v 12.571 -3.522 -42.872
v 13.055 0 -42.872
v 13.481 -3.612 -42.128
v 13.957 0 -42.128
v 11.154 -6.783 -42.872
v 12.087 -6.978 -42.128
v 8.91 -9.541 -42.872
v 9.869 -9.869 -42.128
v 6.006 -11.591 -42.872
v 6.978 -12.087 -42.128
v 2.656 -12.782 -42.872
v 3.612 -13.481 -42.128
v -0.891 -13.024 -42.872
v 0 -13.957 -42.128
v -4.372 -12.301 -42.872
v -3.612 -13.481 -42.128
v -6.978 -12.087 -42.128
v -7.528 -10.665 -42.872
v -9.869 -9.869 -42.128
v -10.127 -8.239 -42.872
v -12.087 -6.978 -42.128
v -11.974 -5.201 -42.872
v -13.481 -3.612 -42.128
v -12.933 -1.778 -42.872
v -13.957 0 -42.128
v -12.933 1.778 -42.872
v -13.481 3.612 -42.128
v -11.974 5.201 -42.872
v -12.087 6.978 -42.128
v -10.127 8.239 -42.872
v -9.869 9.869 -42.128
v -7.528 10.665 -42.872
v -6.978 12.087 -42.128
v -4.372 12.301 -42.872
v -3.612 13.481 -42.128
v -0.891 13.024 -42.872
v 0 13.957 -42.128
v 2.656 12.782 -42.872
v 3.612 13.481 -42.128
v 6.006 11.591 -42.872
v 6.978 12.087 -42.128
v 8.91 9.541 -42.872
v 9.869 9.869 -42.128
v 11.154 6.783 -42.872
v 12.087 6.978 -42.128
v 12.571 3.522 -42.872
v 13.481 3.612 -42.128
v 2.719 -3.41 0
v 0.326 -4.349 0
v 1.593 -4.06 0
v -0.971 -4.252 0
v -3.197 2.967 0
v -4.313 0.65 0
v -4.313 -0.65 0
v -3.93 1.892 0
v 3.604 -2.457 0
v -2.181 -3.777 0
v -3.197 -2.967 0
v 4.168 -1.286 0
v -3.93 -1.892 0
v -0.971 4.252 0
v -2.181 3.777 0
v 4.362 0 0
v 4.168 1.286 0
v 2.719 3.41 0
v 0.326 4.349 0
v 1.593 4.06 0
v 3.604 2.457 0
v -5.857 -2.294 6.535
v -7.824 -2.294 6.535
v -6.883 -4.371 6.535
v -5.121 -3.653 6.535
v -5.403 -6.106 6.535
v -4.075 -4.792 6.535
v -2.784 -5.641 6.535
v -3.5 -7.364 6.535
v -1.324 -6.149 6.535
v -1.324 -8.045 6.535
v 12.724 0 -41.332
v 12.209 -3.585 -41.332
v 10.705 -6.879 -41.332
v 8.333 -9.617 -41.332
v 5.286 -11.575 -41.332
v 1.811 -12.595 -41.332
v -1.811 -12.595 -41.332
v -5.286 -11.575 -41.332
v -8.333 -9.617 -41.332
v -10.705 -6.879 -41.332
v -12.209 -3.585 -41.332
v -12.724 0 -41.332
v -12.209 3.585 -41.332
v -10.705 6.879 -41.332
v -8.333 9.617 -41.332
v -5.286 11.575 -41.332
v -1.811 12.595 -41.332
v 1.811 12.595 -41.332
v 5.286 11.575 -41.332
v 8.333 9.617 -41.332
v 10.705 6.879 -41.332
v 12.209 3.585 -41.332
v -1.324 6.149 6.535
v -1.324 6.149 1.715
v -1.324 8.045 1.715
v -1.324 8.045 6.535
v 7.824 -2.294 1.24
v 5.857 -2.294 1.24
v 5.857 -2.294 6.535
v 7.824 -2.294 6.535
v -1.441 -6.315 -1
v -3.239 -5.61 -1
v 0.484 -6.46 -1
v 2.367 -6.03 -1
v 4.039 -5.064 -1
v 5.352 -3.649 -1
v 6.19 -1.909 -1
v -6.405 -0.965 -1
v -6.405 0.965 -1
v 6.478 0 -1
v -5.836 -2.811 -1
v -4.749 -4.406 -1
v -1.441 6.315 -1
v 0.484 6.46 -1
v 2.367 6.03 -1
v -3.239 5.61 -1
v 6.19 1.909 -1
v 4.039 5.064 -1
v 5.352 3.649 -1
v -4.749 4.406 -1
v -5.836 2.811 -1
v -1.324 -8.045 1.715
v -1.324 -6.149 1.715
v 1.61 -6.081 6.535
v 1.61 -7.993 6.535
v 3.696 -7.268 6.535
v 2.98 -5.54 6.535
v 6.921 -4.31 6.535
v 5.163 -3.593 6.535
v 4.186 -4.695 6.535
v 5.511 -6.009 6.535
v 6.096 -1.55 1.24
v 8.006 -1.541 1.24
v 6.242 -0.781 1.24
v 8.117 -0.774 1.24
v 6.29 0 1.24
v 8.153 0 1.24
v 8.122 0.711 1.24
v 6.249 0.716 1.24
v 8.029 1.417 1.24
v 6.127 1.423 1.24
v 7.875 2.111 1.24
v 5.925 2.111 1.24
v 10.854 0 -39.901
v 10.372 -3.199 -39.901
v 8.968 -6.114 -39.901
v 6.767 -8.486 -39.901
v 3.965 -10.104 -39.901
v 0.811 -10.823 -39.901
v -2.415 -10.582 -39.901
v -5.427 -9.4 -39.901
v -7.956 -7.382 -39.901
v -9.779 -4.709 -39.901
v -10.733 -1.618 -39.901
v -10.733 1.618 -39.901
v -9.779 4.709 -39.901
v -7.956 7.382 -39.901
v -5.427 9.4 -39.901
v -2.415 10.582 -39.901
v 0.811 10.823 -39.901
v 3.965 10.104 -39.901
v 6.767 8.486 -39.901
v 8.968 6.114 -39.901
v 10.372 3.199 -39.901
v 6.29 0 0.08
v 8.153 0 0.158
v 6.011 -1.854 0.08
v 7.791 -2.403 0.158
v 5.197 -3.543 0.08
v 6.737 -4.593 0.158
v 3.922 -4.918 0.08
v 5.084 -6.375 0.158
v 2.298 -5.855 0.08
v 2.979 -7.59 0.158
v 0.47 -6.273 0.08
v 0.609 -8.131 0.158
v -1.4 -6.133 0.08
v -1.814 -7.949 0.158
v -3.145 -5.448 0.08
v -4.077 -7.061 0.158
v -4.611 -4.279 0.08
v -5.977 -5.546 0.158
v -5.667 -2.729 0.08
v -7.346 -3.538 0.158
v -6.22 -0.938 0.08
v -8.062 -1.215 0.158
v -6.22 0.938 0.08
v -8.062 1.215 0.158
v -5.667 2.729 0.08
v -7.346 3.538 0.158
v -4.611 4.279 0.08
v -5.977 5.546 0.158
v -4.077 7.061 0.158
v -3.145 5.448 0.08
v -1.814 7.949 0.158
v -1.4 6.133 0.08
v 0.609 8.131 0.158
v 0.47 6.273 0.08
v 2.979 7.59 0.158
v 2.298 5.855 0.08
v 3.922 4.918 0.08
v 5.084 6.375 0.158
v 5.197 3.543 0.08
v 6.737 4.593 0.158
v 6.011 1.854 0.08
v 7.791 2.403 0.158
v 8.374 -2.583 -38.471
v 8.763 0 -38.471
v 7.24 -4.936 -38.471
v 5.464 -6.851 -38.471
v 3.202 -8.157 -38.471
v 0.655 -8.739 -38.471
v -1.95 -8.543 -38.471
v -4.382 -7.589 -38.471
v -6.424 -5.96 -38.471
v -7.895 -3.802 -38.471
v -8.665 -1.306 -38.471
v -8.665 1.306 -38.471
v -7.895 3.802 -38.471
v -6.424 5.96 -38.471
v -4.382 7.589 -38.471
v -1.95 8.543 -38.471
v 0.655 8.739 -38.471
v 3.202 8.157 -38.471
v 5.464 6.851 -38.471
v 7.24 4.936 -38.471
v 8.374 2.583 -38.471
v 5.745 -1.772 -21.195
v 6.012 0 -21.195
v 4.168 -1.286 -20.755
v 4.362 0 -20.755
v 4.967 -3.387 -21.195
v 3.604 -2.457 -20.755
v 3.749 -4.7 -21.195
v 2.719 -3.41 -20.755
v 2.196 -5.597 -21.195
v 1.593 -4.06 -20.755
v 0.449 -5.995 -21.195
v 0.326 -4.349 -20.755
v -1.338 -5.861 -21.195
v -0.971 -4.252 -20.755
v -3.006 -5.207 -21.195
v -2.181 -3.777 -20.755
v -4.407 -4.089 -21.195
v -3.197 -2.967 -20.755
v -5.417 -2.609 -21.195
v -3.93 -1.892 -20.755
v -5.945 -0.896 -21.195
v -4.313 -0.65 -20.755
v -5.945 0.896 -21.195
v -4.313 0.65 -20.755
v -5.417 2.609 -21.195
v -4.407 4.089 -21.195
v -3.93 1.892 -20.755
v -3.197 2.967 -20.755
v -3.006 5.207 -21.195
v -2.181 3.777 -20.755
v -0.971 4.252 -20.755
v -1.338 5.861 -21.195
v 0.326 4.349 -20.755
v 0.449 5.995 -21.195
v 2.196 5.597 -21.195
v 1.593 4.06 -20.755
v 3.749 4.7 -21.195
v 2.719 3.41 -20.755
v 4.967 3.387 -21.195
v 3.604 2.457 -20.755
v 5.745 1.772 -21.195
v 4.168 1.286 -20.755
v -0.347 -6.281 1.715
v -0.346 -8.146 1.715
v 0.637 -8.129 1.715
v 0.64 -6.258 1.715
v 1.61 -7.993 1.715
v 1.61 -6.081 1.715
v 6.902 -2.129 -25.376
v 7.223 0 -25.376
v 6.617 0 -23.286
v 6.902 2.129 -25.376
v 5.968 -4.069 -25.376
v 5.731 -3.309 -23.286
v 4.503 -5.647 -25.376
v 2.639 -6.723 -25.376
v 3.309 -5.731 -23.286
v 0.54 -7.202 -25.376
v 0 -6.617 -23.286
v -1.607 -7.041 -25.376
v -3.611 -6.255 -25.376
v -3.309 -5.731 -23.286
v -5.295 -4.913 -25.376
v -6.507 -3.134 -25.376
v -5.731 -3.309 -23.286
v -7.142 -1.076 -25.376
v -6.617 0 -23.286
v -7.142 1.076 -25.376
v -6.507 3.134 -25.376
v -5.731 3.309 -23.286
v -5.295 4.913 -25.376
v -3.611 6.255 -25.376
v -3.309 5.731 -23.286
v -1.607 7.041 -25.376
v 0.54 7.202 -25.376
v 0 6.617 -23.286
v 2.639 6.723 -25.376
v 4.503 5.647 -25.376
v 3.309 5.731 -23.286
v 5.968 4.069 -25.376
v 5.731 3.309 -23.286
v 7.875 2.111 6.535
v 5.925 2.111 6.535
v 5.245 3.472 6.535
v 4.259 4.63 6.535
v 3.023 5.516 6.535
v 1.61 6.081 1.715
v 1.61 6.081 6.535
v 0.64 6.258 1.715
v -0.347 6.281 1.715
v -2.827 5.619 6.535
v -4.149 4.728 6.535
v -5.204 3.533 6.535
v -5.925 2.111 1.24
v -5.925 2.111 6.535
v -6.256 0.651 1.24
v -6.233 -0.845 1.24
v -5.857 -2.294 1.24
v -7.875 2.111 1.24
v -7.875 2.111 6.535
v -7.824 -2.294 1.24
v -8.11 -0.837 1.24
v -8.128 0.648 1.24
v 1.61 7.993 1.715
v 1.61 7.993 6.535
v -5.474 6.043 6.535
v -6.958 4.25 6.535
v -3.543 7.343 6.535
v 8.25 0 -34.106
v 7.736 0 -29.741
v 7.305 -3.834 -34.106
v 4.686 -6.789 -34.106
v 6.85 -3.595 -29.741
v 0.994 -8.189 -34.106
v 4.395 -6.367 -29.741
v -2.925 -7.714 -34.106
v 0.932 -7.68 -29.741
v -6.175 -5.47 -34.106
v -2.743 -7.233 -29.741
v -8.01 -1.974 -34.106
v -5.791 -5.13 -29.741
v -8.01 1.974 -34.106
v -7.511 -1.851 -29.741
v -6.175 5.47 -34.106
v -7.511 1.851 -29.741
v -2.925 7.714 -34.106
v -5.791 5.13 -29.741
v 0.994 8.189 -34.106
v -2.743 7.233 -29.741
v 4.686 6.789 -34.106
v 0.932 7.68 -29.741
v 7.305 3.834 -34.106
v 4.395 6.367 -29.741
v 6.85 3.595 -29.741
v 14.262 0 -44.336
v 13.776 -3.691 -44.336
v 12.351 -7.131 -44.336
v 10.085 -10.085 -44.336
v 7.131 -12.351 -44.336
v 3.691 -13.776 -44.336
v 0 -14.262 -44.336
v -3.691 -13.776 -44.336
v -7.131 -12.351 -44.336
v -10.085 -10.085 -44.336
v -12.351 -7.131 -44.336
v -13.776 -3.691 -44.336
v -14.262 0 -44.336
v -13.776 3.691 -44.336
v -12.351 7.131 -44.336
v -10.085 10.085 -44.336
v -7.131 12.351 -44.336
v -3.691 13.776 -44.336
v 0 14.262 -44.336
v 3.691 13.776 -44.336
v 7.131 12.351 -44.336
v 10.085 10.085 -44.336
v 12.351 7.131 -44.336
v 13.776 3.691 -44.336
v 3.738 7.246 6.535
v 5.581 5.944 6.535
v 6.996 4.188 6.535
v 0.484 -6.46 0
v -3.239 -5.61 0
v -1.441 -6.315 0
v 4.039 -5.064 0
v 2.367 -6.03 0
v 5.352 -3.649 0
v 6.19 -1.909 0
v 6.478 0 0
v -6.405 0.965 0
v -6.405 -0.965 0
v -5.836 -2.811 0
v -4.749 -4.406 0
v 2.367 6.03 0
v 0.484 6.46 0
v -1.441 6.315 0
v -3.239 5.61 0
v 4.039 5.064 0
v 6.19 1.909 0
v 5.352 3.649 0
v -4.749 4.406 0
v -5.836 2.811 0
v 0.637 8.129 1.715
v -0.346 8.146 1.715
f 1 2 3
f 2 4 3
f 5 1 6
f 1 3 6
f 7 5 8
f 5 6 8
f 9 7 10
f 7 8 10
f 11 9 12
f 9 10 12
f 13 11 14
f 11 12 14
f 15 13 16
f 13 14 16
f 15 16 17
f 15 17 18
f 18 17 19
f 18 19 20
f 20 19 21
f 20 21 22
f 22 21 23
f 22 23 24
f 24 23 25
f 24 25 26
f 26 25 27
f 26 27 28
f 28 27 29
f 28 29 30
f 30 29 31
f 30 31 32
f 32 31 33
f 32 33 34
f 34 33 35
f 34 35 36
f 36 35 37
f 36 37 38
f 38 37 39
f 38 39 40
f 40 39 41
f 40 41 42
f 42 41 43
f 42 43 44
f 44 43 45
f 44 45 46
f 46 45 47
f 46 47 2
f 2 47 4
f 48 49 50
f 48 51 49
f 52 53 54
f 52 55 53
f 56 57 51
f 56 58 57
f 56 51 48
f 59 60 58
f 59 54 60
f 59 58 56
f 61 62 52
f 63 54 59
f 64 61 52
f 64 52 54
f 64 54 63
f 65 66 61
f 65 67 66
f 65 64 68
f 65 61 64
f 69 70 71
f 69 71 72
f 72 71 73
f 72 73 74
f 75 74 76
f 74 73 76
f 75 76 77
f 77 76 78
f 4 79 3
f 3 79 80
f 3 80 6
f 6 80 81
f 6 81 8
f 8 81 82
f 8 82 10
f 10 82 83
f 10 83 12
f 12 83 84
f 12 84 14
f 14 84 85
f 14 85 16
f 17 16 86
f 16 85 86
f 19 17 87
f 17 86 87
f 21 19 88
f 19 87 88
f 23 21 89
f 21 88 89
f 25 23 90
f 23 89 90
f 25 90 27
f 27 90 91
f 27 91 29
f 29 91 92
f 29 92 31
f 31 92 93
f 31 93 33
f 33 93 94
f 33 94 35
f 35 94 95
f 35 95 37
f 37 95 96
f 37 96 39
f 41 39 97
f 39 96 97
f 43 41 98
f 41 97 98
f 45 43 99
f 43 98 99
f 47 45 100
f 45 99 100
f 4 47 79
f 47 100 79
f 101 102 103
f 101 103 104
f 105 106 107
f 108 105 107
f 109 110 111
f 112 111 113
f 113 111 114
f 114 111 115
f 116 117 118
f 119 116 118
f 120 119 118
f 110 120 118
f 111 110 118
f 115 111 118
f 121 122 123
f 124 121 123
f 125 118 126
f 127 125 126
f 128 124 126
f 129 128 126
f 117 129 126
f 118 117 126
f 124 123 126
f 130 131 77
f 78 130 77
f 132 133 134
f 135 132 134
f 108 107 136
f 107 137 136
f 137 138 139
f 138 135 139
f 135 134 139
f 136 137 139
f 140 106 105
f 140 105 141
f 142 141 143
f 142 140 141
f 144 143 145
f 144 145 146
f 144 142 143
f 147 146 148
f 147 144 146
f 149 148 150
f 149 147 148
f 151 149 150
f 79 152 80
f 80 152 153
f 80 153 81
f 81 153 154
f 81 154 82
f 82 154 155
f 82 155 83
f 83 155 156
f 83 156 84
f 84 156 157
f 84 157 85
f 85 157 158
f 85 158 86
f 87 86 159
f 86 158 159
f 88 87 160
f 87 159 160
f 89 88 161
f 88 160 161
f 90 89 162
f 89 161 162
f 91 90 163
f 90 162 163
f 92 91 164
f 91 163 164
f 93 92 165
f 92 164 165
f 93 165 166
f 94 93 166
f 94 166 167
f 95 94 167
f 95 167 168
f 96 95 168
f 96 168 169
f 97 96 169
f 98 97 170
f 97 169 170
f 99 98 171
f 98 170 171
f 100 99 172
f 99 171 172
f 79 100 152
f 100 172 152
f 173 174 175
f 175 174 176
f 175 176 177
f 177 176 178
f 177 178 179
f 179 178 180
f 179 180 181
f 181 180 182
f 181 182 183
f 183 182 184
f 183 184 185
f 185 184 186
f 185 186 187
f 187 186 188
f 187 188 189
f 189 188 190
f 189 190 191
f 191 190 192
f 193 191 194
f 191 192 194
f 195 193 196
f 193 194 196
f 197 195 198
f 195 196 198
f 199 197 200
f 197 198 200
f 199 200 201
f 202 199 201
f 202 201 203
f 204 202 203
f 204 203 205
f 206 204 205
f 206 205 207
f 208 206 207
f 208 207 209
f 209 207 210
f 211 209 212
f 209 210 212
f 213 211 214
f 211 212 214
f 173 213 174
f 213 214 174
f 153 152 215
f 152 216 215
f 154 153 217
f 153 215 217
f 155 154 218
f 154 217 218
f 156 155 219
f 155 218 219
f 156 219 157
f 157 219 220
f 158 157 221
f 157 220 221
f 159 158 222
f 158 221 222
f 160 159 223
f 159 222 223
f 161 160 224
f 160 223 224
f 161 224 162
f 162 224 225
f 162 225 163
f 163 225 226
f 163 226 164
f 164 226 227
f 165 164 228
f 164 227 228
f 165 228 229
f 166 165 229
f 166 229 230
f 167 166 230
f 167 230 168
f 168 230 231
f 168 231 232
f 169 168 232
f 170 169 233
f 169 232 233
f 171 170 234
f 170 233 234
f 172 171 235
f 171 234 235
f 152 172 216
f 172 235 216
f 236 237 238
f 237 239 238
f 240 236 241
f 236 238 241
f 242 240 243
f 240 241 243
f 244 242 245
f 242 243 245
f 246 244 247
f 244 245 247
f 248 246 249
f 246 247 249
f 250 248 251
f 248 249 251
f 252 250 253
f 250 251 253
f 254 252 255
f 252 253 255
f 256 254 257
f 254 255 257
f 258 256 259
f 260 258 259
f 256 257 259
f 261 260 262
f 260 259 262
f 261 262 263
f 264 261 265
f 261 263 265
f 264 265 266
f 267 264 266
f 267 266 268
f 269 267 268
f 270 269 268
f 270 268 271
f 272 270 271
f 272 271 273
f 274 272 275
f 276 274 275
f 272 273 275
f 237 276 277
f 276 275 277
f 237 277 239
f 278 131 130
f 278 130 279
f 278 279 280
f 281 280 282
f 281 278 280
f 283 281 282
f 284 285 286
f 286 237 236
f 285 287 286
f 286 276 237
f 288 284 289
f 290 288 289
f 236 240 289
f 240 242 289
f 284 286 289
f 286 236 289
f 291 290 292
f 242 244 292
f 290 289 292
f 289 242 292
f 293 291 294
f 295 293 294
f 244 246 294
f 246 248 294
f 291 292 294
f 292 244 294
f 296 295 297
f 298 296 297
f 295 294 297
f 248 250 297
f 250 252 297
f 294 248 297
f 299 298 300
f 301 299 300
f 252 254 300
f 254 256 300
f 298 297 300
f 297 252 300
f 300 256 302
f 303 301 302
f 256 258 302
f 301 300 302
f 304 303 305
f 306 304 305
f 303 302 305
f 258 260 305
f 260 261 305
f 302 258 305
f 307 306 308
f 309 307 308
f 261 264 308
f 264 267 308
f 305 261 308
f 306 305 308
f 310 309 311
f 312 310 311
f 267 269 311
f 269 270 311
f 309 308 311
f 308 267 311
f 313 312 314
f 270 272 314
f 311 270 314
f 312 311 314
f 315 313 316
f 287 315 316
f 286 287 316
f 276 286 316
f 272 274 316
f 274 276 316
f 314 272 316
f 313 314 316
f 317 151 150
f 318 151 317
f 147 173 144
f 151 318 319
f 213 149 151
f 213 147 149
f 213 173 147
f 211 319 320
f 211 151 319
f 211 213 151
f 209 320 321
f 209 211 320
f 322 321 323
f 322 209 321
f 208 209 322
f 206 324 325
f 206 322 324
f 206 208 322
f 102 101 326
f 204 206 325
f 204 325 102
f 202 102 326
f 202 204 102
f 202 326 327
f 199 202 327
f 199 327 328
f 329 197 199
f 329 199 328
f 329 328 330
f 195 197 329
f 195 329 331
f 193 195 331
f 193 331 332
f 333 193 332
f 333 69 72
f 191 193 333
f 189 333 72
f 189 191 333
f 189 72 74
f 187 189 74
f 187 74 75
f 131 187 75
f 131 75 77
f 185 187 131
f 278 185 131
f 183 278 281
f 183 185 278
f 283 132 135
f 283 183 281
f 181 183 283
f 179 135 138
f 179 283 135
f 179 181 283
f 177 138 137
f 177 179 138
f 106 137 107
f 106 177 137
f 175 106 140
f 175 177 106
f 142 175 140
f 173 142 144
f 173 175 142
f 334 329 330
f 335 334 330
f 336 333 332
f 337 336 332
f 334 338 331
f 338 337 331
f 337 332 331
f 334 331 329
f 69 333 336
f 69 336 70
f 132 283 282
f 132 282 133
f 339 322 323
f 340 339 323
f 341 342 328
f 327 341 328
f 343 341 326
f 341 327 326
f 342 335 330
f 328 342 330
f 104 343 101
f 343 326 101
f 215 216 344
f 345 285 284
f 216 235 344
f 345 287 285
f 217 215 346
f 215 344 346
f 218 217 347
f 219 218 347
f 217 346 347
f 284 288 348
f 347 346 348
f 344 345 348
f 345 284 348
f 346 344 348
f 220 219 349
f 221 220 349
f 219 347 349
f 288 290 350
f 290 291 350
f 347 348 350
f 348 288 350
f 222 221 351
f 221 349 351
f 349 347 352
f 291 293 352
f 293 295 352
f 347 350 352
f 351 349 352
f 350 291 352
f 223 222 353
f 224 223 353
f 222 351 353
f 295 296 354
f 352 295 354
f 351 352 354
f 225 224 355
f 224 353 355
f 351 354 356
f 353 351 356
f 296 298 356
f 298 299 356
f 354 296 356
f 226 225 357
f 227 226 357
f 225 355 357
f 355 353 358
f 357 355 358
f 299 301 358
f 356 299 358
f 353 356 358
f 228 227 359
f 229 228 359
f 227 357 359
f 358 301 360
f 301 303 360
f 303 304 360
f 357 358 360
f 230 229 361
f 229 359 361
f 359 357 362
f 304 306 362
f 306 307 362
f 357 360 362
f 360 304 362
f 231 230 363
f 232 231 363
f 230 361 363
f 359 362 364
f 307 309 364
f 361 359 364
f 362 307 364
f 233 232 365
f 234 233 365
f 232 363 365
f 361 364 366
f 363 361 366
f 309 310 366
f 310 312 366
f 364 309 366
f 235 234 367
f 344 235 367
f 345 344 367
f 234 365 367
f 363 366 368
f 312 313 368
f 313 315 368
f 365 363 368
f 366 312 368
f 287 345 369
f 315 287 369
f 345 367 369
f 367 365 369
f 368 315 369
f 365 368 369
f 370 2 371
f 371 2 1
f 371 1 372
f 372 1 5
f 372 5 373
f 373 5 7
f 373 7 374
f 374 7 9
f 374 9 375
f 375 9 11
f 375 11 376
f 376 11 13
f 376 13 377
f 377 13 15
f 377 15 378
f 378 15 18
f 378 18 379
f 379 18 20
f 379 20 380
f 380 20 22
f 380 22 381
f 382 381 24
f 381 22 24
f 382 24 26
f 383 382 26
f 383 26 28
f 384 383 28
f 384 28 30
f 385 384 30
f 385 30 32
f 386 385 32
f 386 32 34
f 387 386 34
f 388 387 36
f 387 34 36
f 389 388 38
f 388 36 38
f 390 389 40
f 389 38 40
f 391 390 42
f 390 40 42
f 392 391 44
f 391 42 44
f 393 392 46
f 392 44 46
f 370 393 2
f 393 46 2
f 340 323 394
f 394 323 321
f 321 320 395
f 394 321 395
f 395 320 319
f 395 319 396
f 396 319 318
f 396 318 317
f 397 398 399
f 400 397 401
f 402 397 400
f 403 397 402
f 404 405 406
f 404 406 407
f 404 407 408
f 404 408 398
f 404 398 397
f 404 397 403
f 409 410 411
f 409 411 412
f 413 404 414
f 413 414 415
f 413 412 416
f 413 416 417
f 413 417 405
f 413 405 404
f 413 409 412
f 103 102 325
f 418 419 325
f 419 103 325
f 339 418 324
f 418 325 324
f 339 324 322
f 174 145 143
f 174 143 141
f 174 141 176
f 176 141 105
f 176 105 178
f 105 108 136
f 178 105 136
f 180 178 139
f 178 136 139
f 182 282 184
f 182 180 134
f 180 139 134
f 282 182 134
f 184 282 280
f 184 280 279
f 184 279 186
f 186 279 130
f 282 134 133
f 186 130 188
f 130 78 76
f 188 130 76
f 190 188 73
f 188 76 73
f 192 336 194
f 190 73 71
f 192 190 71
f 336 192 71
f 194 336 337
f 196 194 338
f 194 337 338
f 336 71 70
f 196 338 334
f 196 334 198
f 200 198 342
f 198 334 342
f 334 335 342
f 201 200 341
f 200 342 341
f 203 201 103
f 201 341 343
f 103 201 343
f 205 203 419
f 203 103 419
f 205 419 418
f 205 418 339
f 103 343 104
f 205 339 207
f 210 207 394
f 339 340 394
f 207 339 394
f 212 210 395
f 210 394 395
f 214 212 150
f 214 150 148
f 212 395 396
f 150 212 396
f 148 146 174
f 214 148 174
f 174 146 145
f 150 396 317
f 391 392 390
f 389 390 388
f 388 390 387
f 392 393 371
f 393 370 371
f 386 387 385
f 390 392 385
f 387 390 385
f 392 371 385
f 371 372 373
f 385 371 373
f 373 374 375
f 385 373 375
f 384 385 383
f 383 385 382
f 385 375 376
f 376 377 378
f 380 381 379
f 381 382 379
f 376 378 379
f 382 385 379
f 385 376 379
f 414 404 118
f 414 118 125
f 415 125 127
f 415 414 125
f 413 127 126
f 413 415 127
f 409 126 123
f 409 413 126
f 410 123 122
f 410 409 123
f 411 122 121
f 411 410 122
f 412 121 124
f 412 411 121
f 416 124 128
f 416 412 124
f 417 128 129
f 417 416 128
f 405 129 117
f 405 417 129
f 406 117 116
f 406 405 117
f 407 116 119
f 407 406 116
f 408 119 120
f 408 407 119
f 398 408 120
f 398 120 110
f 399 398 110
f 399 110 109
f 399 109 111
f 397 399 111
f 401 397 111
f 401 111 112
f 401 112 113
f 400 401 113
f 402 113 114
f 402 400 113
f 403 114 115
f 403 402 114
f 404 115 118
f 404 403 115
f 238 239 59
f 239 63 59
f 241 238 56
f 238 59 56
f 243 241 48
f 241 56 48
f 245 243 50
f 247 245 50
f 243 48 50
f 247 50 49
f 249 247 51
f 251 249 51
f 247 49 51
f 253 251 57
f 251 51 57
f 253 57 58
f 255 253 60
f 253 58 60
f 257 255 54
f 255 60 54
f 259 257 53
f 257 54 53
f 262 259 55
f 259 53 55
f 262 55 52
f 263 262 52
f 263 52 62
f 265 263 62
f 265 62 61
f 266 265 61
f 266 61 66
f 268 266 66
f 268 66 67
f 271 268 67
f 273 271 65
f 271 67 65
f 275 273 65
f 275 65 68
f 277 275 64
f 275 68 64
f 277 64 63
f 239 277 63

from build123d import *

# Parameters (mm, degrees)
F2_R          = 6.2903170644
F3_DEPTH      = 25
F4_W          = 2.9345224611
F4_H          = 4.864071263
F5_DEPTH      = 25
F5_DEPTH_BACK = 25
F6_W          = 4.4057860505
F6_H          = 5.4571669316
F7_DEPTH      = 25
F7_DEPTH_BACK = 25
F8_R          = 6.4777323638
F9_DEPTH      = 1


with BuildPart() as f1:
    # F0 (on Front) → F1 (revolve)
    with BuildSketch(Plane.XZ):
        Polygon((0, 6.5942350894), (0, -44.3356335163), (14.261810109, -44.3356335163), (13.05461023, -42.8724400699), (13.9565062012, -42.1283356524), (12.7244954929, -41.331898421), (10.8538428321, -39.9014018476), (8.7631130591, -38.4709015489), (7.2225756012, -25.3763329238), (6.0121533461, -21.1948733777), (4.3615777977, -20.7547210157), (4.3615777977, 0), (8.1534618512, 0.1579910895), (8.1534618512, 6.53480459), (4.8017329536, 6.53480459), (4.8017329536, 2.9035371263), (1.8306958955, 2.9035371263), (1.7206574557, 6.6448426805), align=None)
    revolve(axis=Axis((0, 0, -18.8706992134), (0, 0, -1)))

    # F2 (on Top) → F3 (cut)
    with BuildSketch(Plane.XY):
        Circle(F2_R)
    extrude(amount=F3_DEPTH, mode=Mode.SUBTRACT)

    # F4 (on Front) → F5 (cut, two sides)
    with BuildSketch(Plane.XZ) as f5_sk:
        with Locations((0.1430150587, 4.1471930454)):
            Rectangle(F4_W, F4_H)
    extrude(amount=-F5_DEPTH, mode=Mode.SUBTRACT)
    extrude(f5_sk.sketch, amount=F5_DEPTH_BACK, mode=Mode.SUBTRACT)

    # F6 (on Right) → F7 (cut, two sides)
    with BuildSketch(Plane.YZ) as f7_sk:
        with Locations((-0.0914762495, 3.9688184042)):
            Rectangle(F6_W, F6_H)
    extrude(amount=-F7_DEPTH, mode=Mode.SUBTRACT)
    extrude(f7_sk.sketch, amount=F7_DEPTH_BACK, mode=Mode.SUBTRACT)


with BuildPart() as f9:
    # F8 (on Top) → F9 (new body)
    with BuildSketch(Plane.XY):
        Circle(F8_R)
    extrude(amount=-F9_DEPTH)


solid = Compound([f1.part, f9.part])
